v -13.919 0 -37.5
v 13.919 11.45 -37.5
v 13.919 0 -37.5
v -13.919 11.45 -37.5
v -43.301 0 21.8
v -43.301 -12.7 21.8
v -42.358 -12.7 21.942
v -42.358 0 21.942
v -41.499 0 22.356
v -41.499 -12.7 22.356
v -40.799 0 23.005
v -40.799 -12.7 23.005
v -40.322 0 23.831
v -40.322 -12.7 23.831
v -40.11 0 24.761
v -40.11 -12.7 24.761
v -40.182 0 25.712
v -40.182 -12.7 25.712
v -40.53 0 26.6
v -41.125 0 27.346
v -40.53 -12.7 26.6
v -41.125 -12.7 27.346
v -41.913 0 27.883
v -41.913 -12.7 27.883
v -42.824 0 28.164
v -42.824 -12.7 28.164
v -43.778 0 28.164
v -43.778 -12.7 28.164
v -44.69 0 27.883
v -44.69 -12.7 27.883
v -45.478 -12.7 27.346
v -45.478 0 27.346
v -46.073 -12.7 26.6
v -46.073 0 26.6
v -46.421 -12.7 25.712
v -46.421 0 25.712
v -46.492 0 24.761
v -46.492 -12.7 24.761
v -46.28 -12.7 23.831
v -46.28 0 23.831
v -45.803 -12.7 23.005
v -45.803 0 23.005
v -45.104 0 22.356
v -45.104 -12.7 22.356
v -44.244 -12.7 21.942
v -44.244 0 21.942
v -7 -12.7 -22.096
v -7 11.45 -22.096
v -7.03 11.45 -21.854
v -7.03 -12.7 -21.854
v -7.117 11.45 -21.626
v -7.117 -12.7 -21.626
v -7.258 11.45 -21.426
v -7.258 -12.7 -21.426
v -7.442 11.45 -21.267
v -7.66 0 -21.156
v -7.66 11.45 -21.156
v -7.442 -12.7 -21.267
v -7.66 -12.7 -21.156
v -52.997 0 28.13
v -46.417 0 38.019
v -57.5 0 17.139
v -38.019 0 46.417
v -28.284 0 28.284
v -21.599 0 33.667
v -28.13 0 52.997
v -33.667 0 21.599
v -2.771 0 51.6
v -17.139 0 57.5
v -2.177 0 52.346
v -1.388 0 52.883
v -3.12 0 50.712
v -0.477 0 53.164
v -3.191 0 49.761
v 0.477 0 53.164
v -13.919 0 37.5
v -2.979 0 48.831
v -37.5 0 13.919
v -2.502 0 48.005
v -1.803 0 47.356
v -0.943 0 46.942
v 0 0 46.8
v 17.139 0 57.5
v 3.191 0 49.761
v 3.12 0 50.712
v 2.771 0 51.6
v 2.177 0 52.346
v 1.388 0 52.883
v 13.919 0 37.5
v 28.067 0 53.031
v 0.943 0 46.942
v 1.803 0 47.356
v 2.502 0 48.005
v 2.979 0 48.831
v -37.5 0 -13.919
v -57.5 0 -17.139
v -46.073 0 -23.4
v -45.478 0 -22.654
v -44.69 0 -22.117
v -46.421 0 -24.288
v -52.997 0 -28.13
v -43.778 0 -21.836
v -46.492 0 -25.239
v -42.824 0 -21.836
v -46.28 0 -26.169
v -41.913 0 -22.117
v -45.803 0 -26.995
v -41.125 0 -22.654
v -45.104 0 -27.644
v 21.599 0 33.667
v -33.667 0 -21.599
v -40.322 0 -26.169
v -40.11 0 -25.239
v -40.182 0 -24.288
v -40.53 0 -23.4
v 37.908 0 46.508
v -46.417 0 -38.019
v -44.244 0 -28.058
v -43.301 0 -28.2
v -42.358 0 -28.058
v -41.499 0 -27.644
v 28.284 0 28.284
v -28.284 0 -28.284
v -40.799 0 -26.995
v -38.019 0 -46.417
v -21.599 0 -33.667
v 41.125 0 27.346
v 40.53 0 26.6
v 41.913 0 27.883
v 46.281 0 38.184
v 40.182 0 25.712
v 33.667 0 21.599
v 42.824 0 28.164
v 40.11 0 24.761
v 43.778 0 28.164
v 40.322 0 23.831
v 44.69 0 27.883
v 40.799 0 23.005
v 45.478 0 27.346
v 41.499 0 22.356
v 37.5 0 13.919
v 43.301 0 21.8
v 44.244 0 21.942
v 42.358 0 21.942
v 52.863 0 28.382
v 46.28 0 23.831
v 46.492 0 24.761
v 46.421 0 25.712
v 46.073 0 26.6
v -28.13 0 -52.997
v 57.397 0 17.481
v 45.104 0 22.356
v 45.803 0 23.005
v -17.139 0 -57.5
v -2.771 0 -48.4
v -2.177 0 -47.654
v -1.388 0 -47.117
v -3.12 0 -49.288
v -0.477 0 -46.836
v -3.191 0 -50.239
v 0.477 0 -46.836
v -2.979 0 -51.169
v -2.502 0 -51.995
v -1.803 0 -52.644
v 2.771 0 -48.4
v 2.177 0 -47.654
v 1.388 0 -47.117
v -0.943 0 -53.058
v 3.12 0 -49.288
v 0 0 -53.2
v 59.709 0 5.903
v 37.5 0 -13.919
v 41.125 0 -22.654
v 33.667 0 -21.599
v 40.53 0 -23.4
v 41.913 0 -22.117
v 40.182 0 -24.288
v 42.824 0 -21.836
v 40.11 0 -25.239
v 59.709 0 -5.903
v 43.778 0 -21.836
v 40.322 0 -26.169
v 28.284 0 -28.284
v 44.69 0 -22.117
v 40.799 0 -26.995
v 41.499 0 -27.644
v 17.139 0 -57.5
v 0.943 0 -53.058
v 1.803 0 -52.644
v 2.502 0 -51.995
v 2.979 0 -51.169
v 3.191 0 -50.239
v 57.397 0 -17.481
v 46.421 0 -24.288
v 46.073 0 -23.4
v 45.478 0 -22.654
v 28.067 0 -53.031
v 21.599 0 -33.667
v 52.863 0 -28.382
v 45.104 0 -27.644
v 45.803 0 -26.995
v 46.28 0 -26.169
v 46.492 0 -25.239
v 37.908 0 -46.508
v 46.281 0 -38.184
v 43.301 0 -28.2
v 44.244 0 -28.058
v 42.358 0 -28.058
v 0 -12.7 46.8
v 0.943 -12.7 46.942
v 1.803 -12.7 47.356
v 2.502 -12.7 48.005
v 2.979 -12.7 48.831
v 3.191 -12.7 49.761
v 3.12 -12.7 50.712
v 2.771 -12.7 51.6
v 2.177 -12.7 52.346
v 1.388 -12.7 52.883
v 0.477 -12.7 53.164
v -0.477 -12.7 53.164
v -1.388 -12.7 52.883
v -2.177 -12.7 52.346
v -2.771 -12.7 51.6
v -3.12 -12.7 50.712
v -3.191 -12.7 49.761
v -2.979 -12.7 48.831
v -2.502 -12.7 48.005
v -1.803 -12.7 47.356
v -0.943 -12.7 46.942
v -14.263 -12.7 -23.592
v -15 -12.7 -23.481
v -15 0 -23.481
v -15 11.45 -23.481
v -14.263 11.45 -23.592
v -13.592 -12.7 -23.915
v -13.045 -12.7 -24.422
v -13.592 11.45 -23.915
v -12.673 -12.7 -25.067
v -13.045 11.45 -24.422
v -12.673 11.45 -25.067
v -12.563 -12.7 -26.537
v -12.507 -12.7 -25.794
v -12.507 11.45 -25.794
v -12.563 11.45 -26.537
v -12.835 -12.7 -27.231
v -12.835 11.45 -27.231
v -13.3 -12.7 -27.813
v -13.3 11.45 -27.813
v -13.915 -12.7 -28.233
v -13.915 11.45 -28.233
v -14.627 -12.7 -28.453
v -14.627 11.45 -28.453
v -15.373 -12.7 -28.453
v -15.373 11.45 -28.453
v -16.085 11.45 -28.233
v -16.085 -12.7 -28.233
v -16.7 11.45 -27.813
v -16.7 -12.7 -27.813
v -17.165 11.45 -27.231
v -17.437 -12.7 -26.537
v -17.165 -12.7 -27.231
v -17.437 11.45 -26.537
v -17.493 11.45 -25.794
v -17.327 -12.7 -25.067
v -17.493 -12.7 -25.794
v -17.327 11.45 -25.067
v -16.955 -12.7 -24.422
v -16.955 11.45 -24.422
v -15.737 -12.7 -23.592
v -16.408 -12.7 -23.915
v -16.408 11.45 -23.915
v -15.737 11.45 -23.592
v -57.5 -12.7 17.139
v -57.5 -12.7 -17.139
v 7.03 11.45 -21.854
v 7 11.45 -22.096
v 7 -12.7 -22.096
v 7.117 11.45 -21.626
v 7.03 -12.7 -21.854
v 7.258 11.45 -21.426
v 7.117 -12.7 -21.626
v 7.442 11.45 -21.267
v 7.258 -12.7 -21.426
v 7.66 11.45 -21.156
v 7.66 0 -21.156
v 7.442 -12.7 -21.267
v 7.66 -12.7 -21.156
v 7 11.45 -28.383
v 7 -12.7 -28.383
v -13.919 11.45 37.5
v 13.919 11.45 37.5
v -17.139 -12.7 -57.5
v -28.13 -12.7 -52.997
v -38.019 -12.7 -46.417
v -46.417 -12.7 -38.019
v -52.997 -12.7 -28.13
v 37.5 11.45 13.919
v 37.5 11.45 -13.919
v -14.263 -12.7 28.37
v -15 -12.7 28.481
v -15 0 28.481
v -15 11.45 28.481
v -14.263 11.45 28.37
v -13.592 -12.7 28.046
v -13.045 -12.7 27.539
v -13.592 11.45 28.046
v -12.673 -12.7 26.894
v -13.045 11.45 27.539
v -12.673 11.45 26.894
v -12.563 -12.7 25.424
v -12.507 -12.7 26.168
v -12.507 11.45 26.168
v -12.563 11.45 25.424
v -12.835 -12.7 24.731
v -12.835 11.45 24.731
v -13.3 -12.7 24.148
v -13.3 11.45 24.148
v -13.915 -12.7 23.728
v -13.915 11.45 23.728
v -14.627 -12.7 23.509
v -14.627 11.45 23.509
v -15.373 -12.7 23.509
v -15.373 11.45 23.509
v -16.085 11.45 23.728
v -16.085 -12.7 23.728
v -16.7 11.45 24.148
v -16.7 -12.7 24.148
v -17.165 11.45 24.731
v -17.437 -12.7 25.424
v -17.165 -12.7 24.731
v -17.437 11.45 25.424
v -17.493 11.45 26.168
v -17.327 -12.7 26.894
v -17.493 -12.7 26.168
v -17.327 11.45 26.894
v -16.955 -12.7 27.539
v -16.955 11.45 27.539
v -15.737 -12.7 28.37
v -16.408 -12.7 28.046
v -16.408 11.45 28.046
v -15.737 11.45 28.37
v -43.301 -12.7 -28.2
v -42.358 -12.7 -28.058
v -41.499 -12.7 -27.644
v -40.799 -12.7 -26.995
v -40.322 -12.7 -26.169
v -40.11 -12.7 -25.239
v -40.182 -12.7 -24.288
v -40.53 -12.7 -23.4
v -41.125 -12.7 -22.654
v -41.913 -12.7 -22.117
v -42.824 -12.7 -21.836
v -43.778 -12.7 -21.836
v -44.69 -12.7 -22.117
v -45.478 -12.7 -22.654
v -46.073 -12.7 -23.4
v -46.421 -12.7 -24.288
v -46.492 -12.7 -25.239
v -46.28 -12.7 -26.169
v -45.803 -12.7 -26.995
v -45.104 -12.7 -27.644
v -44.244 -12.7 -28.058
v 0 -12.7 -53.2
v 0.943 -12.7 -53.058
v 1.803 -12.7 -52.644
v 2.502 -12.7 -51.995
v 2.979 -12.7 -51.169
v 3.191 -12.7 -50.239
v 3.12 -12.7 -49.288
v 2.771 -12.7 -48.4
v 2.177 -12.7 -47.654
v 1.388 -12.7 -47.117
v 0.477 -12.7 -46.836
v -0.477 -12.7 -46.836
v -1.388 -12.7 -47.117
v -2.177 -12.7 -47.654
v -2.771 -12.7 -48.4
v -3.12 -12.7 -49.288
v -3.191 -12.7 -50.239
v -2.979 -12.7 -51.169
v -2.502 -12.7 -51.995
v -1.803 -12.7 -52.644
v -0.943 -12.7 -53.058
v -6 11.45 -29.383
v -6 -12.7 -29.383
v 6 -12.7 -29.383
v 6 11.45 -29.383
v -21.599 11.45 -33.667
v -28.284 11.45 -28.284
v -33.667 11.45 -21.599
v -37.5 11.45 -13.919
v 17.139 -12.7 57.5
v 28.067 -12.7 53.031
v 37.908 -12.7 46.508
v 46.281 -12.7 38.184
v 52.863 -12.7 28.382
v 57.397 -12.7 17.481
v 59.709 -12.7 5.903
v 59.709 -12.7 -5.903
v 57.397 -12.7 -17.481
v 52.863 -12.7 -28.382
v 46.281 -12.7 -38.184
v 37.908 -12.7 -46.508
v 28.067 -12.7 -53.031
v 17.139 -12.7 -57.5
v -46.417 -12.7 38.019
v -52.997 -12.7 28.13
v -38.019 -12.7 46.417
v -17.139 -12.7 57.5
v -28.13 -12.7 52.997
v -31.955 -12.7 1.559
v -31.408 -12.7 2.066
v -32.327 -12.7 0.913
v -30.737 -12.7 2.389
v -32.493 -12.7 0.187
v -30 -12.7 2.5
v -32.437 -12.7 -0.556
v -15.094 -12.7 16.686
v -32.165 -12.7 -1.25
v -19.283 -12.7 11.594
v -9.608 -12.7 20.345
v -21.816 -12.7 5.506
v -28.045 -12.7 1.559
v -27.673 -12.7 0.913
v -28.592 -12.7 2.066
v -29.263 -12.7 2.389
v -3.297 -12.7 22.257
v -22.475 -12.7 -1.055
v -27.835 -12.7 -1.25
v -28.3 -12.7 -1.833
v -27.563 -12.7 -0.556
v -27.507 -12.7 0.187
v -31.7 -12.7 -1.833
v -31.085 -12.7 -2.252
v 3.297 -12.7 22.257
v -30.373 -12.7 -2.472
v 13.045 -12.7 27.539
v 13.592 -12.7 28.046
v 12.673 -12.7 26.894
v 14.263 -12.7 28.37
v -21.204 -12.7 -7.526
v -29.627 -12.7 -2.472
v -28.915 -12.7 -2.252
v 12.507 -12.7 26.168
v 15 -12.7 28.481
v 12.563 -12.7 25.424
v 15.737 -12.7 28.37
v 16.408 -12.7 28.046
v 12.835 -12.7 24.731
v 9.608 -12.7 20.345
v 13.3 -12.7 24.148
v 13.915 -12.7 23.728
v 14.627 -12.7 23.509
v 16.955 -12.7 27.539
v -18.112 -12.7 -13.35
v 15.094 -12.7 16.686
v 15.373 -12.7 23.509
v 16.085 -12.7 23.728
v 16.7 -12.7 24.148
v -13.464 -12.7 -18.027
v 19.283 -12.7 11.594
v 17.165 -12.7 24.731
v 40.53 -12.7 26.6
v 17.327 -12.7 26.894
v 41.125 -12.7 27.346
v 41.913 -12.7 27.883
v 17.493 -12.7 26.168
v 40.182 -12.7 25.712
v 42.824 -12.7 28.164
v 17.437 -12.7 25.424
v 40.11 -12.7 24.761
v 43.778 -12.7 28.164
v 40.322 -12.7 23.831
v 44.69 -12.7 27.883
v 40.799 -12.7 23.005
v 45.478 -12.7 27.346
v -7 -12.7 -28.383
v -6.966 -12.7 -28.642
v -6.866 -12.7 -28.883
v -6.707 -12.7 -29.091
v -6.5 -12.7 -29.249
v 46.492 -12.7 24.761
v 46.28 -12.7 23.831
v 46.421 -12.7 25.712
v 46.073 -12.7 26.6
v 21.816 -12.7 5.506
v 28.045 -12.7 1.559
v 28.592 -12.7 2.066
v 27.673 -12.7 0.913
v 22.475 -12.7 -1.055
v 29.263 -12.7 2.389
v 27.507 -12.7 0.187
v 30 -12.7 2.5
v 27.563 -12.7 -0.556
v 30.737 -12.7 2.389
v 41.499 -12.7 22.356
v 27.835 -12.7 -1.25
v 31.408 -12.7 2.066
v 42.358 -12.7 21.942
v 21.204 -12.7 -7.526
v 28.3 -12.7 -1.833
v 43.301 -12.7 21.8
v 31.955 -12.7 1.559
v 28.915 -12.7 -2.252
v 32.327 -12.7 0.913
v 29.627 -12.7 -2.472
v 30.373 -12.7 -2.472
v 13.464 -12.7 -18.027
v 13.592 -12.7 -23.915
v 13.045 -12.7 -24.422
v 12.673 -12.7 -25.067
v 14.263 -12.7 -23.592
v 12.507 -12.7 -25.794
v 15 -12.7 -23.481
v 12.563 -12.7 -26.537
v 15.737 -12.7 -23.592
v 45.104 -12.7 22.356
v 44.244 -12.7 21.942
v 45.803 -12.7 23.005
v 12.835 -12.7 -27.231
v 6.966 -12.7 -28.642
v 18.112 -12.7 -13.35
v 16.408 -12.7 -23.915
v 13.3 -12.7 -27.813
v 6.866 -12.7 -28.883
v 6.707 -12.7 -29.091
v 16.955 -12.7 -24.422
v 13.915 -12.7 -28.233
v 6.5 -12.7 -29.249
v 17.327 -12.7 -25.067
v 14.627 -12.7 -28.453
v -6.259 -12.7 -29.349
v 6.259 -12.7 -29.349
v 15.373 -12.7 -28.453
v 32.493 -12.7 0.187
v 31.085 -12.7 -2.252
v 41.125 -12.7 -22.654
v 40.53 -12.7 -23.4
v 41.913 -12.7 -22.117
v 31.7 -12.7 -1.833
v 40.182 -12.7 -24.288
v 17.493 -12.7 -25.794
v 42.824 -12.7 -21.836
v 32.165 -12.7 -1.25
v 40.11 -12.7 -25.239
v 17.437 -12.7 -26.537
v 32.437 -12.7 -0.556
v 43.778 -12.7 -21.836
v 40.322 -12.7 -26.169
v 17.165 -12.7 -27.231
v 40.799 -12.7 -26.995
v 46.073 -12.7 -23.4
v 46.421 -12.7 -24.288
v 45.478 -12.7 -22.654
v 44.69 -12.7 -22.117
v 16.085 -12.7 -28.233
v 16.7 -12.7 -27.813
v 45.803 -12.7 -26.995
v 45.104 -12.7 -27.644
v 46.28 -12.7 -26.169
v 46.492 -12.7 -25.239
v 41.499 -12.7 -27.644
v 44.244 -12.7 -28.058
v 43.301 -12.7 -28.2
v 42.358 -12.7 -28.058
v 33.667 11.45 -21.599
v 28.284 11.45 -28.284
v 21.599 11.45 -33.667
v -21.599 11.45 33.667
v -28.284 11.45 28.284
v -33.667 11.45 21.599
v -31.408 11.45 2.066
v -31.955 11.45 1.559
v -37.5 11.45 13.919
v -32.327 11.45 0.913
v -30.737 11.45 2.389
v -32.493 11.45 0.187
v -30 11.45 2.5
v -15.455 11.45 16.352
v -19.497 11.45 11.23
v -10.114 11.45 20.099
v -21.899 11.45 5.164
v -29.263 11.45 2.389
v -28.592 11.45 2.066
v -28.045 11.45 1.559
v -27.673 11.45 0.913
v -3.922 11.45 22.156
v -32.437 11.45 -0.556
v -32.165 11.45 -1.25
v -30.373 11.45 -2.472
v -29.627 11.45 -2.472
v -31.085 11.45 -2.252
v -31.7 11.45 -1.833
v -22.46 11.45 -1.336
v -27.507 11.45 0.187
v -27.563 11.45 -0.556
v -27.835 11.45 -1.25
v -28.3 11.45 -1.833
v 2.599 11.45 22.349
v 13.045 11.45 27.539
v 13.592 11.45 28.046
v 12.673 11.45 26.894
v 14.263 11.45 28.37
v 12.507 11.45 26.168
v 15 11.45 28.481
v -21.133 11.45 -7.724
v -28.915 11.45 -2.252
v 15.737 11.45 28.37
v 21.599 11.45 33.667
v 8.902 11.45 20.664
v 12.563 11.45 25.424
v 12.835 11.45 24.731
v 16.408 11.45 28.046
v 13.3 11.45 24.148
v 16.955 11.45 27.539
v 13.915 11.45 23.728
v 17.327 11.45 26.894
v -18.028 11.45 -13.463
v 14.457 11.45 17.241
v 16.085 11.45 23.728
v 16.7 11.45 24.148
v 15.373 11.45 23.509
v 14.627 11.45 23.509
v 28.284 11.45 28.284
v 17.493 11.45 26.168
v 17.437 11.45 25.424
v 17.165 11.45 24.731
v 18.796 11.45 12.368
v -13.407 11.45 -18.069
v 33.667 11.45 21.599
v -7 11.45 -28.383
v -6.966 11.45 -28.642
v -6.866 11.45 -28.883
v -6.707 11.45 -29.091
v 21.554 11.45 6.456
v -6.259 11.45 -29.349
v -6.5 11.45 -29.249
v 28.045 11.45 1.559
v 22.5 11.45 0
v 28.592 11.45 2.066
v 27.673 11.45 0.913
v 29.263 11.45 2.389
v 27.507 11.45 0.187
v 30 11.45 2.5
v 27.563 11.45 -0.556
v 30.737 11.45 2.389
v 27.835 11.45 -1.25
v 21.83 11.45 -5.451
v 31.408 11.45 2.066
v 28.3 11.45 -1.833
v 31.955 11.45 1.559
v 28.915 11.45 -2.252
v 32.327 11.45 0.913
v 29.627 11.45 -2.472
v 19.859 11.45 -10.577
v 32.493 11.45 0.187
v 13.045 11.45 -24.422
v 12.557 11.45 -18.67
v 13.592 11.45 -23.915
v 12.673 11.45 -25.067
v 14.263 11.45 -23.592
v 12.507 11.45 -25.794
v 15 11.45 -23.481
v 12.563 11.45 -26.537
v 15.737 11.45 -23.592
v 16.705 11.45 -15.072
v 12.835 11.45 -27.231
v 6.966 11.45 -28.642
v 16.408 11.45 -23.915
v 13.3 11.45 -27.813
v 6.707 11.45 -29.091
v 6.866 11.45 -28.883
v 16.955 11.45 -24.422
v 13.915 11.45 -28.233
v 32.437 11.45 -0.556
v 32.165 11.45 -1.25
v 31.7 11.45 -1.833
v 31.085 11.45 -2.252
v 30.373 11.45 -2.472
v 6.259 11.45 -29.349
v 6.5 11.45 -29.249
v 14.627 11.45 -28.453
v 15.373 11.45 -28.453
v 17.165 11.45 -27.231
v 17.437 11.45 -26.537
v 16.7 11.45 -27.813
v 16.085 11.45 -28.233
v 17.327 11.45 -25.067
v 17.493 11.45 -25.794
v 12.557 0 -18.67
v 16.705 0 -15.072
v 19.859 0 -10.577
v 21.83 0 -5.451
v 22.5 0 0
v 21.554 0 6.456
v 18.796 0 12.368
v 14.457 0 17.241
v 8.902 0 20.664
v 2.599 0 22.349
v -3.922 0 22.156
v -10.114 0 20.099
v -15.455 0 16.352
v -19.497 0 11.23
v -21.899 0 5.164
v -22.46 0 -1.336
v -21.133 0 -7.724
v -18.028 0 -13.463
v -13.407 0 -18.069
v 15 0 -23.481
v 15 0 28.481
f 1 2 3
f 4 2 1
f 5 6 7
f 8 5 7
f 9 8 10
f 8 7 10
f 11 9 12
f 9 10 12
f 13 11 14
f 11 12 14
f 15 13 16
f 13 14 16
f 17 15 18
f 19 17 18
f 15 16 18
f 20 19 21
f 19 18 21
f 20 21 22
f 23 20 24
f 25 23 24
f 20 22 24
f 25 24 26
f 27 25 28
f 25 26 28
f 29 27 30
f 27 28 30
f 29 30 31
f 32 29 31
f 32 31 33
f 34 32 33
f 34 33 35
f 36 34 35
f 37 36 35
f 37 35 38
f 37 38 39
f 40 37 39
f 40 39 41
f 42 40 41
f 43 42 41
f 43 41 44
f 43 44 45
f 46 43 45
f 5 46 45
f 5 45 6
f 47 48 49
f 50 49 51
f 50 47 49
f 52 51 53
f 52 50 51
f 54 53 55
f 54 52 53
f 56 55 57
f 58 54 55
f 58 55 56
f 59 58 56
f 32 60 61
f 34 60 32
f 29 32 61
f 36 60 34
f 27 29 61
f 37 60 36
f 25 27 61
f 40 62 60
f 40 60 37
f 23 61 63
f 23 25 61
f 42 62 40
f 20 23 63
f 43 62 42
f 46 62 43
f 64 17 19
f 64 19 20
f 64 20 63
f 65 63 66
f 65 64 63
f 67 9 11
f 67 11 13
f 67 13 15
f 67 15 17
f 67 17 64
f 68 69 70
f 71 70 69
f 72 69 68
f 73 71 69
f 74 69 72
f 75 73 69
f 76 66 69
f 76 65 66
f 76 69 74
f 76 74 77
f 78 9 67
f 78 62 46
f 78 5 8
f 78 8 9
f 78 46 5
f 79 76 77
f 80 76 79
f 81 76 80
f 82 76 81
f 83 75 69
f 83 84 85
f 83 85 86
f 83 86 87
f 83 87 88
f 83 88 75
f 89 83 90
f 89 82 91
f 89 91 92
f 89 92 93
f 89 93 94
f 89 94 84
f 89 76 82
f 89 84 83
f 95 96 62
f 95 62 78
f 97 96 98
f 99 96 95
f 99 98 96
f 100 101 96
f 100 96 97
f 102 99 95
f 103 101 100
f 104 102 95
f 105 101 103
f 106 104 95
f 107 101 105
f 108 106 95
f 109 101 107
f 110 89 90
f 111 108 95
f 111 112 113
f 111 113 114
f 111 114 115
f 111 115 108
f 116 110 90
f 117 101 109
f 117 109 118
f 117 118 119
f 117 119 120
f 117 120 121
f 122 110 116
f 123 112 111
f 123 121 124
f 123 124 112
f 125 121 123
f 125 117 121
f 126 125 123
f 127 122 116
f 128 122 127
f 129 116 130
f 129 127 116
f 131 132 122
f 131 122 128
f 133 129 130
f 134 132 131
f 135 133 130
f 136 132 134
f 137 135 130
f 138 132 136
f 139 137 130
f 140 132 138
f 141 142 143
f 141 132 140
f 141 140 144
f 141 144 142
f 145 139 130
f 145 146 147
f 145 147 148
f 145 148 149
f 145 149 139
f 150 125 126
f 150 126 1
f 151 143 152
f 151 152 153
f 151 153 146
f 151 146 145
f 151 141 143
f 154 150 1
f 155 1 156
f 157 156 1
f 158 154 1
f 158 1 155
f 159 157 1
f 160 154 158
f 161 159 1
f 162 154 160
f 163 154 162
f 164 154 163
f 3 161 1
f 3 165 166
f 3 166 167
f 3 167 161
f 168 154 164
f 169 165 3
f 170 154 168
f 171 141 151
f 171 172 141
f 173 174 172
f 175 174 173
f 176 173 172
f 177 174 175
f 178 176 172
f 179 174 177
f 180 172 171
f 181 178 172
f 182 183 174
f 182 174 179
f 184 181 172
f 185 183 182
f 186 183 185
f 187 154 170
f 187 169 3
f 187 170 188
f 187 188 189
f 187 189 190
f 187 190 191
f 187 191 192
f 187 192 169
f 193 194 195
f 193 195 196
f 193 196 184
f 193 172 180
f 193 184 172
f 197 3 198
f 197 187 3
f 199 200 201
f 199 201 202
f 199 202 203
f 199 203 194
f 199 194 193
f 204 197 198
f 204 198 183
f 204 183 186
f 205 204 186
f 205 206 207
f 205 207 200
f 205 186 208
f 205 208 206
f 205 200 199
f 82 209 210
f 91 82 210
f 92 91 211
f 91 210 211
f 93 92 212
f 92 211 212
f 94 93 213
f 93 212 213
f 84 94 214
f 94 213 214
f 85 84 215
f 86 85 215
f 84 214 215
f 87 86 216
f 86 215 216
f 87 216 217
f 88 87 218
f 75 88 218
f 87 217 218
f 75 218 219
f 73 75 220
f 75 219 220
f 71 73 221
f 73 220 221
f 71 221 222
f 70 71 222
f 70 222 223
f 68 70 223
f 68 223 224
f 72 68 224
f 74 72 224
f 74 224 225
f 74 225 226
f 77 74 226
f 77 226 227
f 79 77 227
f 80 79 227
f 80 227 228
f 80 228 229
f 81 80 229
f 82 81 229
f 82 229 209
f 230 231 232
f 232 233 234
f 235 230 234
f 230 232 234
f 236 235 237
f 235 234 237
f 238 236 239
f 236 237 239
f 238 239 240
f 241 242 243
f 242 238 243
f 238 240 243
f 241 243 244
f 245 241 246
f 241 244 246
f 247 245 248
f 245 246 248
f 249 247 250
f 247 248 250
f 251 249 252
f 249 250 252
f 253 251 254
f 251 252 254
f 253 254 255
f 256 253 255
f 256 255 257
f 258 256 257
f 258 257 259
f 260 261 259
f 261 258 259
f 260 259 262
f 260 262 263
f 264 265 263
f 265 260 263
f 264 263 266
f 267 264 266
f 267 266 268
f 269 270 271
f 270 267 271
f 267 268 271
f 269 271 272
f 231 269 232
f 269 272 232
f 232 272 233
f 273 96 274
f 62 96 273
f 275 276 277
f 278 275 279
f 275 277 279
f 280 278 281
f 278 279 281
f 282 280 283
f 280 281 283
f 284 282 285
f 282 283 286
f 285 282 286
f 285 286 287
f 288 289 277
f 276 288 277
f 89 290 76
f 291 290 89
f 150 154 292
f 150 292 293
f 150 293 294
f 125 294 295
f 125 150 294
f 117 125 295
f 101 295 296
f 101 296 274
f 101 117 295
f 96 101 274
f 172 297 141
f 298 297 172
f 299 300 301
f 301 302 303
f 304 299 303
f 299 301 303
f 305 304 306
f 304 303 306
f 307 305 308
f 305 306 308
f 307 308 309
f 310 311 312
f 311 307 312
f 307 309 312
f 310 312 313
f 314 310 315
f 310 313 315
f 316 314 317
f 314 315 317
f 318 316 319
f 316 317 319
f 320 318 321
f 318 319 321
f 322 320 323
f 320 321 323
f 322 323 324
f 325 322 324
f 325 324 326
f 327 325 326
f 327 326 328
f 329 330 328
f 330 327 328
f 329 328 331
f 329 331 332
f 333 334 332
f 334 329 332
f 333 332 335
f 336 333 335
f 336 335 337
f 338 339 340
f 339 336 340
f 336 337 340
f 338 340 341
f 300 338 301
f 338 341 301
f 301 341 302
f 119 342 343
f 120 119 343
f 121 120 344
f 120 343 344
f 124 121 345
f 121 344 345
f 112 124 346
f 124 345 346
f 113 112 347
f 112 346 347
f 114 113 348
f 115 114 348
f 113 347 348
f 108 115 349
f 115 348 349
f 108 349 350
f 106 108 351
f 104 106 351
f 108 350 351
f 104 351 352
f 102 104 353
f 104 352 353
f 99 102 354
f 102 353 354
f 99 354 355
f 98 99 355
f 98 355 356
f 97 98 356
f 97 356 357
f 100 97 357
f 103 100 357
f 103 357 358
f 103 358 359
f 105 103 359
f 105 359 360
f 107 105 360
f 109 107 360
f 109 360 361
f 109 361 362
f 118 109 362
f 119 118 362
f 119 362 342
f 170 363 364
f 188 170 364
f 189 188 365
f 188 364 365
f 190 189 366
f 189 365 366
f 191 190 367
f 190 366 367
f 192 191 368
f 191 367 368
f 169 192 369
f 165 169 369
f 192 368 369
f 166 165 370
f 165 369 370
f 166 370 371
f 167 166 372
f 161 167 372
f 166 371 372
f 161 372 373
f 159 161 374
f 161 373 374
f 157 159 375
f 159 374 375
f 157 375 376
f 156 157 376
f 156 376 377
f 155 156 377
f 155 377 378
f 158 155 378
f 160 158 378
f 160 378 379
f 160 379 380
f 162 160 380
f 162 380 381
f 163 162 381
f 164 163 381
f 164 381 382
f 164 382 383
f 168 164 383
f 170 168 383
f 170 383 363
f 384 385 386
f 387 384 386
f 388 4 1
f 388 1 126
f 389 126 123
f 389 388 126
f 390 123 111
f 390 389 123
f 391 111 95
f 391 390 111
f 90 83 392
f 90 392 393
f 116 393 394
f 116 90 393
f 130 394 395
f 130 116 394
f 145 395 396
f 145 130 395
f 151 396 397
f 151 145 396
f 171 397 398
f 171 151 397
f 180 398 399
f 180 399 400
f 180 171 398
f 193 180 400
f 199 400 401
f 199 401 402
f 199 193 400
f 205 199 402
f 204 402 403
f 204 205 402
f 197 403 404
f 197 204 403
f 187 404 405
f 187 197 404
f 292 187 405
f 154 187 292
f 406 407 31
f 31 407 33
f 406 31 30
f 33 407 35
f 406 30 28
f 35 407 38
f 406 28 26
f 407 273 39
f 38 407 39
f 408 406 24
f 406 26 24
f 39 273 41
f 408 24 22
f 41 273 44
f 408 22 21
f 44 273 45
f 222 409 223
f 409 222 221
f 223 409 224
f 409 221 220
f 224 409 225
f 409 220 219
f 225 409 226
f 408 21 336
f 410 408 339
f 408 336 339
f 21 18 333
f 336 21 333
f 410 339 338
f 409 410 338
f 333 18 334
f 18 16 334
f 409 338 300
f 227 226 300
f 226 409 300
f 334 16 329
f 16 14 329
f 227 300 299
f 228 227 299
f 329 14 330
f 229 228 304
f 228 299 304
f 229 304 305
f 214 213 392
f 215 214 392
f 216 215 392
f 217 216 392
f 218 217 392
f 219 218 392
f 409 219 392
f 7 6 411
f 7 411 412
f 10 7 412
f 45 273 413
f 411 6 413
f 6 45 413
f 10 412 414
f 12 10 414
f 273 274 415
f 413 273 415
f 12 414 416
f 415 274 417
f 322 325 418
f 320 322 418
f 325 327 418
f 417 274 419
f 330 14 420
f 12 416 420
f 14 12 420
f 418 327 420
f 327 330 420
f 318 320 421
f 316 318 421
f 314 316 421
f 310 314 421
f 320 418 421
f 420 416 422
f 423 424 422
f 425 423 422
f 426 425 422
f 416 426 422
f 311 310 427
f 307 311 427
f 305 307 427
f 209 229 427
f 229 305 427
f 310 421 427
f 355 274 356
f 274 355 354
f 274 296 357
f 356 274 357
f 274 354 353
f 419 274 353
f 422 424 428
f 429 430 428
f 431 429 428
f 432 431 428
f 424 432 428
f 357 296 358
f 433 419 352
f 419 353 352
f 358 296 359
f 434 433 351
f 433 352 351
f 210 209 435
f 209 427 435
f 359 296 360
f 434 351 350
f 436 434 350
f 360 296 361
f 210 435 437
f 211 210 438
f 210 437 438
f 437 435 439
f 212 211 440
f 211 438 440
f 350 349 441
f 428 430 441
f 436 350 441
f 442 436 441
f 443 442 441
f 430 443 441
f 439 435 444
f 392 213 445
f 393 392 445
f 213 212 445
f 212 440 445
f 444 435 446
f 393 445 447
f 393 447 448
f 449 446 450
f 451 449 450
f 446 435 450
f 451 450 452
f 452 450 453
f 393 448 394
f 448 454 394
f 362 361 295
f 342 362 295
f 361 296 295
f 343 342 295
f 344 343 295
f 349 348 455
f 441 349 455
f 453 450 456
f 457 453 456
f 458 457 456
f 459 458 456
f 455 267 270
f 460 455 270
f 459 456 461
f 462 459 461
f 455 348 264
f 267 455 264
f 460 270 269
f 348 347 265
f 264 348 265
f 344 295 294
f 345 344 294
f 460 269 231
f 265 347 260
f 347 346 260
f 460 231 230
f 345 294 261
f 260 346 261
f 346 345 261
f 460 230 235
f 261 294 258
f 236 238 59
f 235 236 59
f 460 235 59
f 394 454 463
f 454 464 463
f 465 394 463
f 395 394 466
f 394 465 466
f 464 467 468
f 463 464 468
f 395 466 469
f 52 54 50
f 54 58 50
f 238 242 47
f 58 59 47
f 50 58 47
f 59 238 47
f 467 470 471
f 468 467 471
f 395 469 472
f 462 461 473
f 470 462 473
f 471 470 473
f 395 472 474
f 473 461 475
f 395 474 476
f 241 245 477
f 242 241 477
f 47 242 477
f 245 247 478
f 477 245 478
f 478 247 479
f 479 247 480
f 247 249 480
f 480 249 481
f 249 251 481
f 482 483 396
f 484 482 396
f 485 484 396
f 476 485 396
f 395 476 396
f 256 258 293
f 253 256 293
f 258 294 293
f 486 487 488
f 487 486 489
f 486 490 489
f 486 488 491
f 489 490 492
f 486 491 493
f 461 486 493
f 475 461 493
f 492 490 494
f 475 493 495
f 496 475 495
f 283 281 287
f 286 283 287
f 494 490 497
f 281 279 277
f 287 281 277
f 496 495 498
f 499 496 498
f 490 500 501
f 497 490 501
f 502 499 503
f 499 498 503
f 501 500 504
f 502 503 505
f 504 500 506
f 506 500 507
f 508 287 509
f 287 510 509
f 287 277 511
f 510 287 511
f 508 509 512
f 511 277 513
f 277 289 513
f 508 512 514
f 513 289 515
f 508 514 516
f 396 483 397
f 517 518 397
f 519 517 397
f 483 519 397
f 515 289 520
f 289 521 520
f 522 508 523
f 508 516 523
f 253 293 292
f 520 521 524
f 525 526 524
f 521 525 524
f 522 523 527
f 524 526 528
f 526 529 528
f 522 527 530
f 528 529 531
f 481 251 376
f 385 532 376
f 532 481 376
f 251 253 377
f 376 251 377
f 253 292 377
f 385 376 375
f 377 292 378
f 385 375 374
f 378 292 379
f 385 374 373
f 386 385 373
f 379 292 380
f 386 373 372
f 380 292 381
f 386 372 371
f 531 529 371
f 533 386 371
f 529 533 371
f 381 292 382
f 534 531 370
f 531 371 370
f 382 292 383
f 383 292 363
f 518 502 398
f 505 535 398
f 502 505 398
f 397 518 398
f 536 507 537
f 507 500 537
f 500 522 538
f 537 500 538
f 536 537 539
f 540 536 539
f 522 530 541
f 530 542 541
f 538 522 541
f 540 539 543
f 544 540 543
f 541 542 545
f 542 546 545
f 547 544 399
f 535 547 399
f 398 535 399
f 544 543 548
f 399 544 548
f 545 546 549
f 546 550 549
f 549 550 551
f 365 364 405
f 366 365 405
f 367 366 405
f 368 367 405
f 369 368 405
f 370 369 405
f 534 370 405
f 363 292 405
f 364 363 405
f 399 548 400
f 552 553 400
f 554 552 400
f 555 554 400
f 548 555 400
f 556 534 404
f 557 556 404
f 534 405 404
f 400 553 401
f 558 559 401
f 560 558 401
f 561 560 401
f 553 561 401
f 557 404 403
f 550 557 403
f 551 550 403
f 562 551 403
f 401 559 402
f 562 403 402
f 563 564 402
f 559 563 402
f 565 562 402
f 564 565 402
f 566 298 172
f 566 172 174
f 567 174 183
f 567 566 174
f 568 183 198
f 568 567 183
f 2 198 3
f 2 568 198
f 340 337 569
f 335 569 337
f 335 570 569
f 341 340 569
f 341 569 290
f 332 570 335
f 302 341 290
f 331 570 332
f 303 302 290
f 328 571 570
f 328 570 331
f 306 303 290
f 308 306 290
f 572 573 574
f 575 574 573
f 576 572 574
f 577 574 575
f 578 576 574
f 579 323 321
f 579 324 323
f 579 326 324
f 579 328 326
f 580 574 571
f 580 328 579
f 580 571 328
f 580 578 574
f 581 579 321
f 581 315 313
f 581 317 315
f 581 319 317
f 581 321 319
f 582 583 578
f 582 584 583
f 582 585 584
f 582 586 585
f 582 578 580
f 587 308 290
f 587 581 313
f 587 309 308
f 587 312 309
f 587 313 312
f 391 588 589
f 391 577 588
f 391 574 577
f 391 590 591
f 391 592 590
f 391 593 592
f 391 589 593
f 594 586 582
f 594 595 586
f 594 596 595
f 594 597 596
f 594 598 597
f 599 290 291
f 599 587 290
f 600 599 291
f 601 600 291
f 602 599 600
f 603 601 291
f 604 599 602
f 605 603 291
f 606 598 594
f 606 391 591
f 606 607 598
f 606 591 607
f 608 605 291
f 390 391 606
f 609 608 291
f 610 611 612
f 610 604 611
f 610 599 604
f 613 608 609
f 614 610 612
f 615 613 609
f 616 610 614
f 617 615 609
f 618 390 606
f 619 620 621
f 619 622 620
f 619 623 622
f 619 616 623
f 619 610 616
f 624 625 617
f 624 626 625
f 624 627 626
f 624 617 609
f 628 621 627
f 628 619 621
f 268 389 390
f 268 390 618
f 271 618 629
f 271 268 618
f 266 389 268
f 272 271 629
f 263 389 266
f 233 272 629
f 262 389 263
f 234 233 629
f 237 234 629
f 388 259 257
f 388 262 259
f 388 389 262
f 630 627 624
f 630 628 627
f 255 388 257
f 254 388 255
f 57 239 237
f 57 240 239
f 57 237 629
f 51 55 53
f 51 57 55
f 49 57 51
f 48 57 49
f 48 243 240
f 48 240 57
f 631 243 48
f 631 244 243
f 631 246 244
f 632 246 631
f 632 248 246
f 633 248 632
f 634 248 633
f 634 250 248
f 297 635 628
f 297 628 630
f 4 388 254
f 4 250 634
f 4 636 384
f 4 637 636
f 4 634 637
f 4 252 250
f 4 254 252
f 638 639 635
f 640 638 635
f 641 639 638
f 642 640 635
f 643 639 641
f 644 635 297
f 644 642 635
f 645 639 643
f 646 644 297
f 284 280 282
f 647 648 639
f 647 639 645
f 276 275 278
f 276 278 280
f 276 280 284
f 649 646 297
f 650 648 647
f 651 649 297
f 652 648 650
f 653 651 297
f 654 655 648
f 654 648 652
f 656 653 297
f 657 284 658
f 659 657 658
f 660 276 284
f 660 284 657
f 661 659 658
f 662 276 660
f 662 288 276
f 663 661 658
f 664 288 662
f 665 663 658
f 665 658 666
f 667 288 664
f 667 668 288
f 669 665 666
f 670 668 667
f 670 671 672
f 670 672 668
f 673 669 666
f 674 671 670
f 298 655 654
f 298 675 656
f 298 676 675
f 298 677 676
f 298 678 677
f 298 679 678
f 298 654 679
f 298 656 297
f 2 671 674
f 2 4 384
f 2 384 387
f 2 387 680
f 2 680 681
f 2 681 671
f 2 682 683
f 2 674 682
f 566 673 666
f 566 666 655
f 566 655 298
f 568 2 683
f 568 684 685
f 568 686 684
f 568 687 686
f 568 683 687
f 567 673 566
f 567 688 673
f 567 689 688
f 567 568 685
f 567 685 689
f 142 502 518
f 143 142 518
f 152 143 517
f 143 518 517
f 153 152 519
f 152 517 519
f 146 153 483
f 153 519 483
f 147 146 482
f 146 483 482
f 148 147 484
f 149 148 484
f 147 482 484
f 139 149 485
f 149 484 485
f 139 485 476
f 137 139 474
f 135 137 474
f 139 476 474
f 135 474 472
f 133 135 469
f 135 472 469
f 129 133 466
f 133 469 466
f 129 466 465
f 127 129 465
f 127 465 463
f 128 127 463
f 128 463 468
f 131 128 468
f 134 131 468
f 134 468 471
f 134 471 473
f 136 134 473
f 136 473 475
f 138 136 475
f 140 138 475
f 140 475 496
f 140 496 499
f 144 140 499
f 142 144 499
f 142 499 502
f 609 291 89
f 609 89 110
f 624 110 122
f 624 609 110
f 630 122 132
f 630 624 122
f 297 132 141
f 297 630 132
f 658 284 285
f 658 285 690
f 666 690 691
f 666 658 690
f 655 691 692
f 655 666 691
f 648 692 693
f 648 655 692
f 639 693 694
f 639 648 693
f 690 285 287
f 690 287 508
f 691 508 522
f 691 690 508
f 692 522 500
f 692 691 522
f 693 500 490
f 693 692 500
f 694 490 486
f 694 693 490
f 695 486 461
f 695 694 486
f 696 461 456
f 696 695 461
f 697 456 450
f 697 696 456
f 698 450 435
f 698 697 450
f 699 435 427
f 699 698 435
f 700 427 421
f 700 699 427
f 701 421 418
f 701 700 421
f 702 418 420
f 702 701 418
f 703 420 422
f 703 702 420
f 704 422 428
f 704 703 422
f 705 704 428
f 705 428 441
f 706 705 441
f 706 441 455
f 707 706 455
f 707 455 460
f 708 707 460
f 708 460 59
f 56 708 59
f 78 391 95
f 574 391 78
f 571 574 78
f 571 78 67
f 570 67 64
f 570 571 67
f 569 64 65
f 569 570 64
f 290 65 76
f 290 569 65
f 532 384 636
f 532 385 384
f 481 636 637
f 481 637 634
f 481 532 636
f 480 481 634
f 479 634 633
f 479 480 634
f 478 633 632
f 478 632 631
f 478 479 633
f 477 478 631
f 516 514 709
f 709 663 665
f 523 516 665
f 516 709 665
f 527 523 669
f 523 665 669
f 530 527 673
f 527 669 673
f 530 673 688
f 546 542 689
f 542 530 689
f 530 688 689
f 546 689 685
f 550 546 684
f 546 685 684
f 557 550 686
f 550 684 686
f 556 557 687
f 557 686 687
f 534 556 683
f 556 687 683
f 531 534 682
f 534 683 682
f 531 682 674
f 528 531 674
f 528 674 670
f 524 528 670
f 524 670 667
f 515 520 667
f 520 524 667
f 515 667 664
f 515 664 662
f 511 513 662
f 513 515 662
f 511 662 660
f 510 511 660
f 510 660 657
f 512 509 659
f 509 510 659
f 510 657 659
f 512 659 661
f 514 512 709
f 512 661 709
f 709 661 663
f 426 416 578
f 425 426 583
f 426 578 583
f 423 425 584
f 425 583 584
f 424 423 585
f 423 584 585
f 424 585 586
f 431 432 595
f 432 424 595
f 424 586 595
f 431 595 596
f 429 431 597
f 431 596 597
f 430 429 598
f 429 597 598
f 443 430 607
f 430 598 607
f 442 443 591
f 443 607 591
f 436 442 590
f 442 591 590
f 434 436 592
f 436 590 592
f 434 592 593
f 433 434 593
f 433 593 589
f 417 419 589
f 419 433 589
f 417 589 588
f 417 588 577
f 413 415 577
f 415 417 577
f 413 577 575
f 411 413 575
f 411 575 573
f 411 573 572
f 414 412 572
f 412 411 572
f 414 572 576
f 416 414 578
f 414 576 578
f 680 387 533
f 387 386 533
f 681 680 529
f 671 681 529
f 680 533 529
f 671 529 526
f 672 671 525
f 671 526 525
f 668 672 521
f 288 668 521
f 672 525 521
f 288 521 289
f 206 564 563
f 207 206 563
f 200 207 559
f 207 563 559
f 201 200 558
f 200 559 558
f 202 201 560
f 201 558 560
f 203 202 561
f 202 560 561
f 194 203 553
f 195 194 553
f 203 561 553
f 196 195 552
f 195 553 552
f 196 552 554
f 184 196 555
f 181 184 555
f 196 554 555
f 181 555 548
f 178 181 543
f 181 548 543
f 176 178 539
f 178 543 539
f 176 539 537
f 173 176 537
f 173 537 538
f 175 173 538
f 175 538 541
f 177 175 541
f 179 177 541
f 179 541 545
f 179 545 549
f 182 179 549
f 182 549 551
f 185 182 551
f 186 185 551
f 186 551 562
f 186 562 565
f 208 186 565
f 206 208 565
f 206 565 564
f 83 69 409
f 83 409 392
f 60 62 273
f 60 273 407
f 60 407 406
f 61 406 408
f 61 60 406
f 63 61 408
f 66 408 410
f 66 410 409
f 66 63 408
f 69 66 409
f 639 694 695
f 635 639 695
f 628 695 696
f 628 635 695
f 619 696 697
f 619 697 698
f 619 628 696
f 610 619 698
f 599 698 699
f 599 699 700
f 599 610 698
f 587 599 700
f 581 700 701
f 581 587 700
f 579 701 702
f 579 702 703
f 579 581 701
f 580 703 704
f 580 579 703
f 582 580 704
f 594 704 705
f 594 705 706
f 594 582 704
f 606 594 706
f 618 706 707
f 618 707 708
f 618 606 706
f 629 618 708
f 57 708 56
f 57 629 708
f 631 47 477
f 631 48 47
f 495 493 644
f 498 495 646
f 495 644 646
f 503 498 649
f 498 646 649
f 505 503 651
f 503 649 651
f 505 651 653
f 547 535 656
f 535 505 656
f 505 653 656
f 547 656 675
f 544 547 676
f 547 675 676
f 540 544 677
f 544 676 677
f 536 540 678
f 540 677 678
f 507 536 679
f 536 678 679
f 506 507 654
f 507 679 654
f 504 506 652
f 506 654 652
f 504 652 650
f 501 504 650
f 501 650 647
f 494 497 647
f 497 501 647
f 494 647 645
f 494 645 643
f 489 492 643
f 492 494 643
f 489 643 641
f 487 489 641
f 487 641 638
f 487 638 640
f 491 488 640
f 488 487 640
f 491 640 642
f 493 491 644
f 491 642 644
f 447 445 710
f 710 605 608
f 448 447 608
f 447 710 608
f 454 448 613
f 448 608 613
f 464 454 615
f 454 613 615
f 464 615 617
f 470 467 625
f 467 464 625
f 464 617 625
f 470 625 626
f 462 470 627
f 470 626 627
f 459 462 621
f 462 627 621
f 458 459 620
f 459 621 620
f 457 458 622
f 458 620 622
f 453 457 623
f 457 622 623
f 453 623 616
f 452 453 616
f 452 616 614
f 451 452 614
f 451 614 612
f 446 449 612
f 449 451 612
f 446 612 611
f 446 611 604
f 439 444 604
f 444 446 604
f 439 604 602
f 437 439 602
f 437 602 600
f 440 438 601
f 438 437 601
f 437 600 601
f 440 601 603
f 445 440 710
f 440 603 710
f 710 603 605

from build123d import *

# Parameters (mm, degrees)
BOSS_EXTRUDE1_DEPTH                  = 12.7
M6_CLEARANCE_HOLE1_D                 = 6.4
BOSS_EXTRUDE2_START                  = 11.45
BOSS_EXTRUDE2_DEPTH                  = 11.45
SKETCH2_W                            = 2.5
SKETCH2_H                            = 12.7
TAP_DRILL_FOR_M6X1_0_TAP1_AT_2_COUNT = 2
TAP_DRILL_FOR_M6X1_0_TAP1_AT_2_PITCH = 30
TAP_DRILL_FOR_M6X1_0_TAP1_AT_3_COUNT = 2
TAP_DRILL_FOR_M6X1_0_TAP1_AT_3_PITCH = 51.961524227
TAP_DRILL_FOR_M6X1_0_TAP1_AT_4_COUNT = 2
TAP_DRILL_FOR_M6X1_0_TAP1_AT_4_PITCH = 60
TAP_DRILL_FOR_M6X1_0_TAP1_AT_5_COUNT = 2
TAP_DRILL_FOR_M6X1_0_TAP1_AT_5_PITCH = 51.961524227
TAP_DRILL_FOR_M6X1_0_TAP1_AT_6_COUNT = 2
TAP_DRILL_FOR_M6X1_0_TAP1_AT_6_PITCH = 30
TAP_DRILL_FOR_M6X1_0_TAP3_D          = 5
FILLET1_R                            = 1


with BuildPart() as part:
    # Sketch1 → Boss-Extrude1 (new body)
    with BuildSketch(Plane(origin=(0, 0, 0), x_dir=(1, 0, 0), z_dir=(0, 1, 0))):
        with BuildLine():
            Line((17.139136501, 57.5), (-17.139136501, 57.5))
            ThreePointArc((-17.139136501, 57.5), (-42.426406871, 42.426406871), (-57.5, 17.139136501))
            Line((-57.5, 17.139136501), (-57.5, -17.139136501))
            ThreePointArc((-57.5, -17.139136501), (-42.426406871, -42.426406871), (-17.139136501, -57.5))
            Line((-17.139136501, -57.5), (17.139136501, -57.5))
            ThreePointArc((17.139136501, -57.5), (60, 0), (17.139136501, 57.5))
        make_face()
        with BuildLine():
            Line((-7, 21.38340478), (-7, 29.38340478))
            Line((-7, 29.38340478), (7, 29.38340478))
            Line((7, 29.38340478), (7, 21.38340478))
            ThreePointArc((7, 21.38340478), (0, -22.5), (-7, 21.38340478))
        make_face(mode=Mode.SUBTRACT)
    extrude(amount=-BOSS_EXTRUDE1_DEPTH)

    # M6 Clearance Hole1 (through all)
    with Locations(Plane(origin=(-43.301270189, 0, 25), x_dir=(0, 0, 1), z_dir=(0, 1, 0))):
        with Locations((0, 0), (-75, 43.301270189), (-50, 86.602540378), (0, 86.602540378), (25, 43.301270189), (-50, 0)):
            Hole(M6_CLEARANCE_HOLE1_D / 2)

    # Sketch1<7> → Boss-Extrude2 (add)
    with BuildSketch(Plane(origin=(0, 0, 0), x_dir=(1, 0, 0), z_dir=(0, 1, 0)).offset(BOSS_EXTRUDE2_START)):
        with BuildLine():
            Line((13.919410907, 37.5), (-13.919410907, 37.5))
            ThreePointArc((-13.919410907, 37.5), (-28.284271247, 28.284271247), (-37.5, 13.919410907))
            Line((-37.5, 13.919410907), (-37.5, -13.919410907))
            ThreePointArc((-37.5, -13.919410907), (-28.284271247, -28.284271247), (-13.919410907, -37.5))
            Line((-13.919410907, -37.5), (13.919410907, -37.5))
            ThreePointArc((13.919410907, -37.5), (28.284271247, -28.284271247), (37.5, -13.919410907))
            Line((37.5, -13.919410907), (37.5, 13.919410907))
            ThreePointArc((37.5, 13.919410907), (28.284271247, 28.284271247), (13.919410907, 37.5))
        make_face()
        with BuildLine():
            ThreePointArc((22.5, 0), (-13.205112646, -18.217436702), (-7, 21.38340478))
            Line((-7, 21.38340478), (-7, 29.38340478))
            Line((-7, 29.38340478), (7, 29.38340478))
            Line((7, 29.38340478), (7, 21.38340478))
            ThreePointArc((7, 21.38340478), (18.217436702, 13.205112646), (22.5, 0))
        make_face(mode=Mode.SUBTRACT)
    extrude(amount=-BOSS_EXTRUDE2_DEPTH)

    # Sketch2 → Tap Drill for M6x1.0 Tap1 (revolve, cut)
    with BuildSketch(Plane(origin=(-30, 0, 0), x_dir=(0, 0, 1), z_dir=(1, 0, 0))):
        with Locations((1.25, 6.35)):
            Rectangle(SKETCH2_W, SKETCH2_H)
    tap_drill_for_m6x1_0_tap1 = revolve(axis=Axis((-30, 6.35, 0), (0, -1, 0)), mode=Mode.SUBTRACT)

    # Tap Drill for M6x1.0 Tap1 at 2: Tap Drill for M6x1.0 Tap1 ×2
    with Locations(*[Vector(0.4999999999999998, 0, -0.8660254037844388) * (i * TAP_DRILL_FOR_M6X1_0_TAP1_AT_2_PITCH) for i in range(1, TAP_DRILL_FOR_M6X1_0_TAP1_AT_2_COUNT)]):
        add(tap_drill_for_m6x1_0_tap1, mode=Mode.SUBTRACT)

    # Tap Drill for M6x1.0 Tap1 at 3: Tap Drill for M6x1.0 Tap1 ×2
    with Locations(*[Vector(0.8660254037844386, 0, -0.5000000000000002) * (i * TAP_DRILL_FOR_M6X1_0_TAP1_AT_3_PITCH) for i in range(1, TAP_DRILL_FOR_M6X1_0_TAP1_AT_3_COUNT)]):
        add(tap_drill_for_m6x1_0_tap1, mode=Mode.SUBTRACT)

    # Tap Drill for M6x1.0 Tap1 at 4: Tap Drill for M6x1.0 Tap1 ×2
    with Locations(*[(i * TAP_DRILL_FOR_M6X1_0_TAP1_AT_4_PITCH, 0, 0) for i in range(1, TAP_DRILL_FOR_M6X1_0_TAP1_AT_4_COUNT)]):
        add(tap_drill_for_m6x1_0_tap1, mode=Mode.SUBTRACT)

    # Tap Drill for M6x1.0 Tap1 at 5: Tap Drill for M6x1.0 Tap1 ×2
    with Locations(*[Vector(0.8660254037844388, 0, 0.49999999999999967) * (i * TAP_DRILL_FOR_M6X1_0_TAP1_AT_5_PITCH) for i in range(1, TAP_DRILL_FOR_M6X1_0_TAP1_AT_5_COUNT)]):
        add(tap_drill_for_m6x1_0_tap1, mode=Mode.SUBTRACT)

    # Tap Drill for M6x1.0 Tap1 at 6: Tap Drill for M6x1.0 Tap1 ×2
    with Locations(*[Vector(0.5000000000000006, 0, 0.8660254037844384) * (i * TAP_DRILL_FOR_M6X1_0_TAP1_AT_6_PITCH) for i in range(1, TAP_DRILL_FOR_M6X1_0_TAP1_AT_6_COUNT)]):
        add(tap_drill_for_m6x1_0_tap1, mode=Mode.SUBTRACT)

    # Tap Drill for M6x1.0 Tap3 (through all)
    with Locations(Plane(origin=(30, 0, 0), x_dir=(0, 0, -1), z_dir=(0, -1, 0))):
        with Locations((0, 0), (25.980762114, -45), (-25.980762114, -15), (0, -60), (-25.980762114, -45), (25.980762114, -15)):
            Hole(TAP_DRILL_FOR_M6X1_0_TAP3_D / 2)

    # Fillet1
    fillet1_edges = [part.edges().sort_by_distance(p)[0] for p in [
        (7, -0.625, -21.38340478),
        (7, -0.625, -29.38340478),
        (-7, -0.625, -29.38340478),
        (-7, -0.625, -21.38340478),
    ]]
    fillet(fillet1_edges, radius=FILLET1_R)


solid = part.part
